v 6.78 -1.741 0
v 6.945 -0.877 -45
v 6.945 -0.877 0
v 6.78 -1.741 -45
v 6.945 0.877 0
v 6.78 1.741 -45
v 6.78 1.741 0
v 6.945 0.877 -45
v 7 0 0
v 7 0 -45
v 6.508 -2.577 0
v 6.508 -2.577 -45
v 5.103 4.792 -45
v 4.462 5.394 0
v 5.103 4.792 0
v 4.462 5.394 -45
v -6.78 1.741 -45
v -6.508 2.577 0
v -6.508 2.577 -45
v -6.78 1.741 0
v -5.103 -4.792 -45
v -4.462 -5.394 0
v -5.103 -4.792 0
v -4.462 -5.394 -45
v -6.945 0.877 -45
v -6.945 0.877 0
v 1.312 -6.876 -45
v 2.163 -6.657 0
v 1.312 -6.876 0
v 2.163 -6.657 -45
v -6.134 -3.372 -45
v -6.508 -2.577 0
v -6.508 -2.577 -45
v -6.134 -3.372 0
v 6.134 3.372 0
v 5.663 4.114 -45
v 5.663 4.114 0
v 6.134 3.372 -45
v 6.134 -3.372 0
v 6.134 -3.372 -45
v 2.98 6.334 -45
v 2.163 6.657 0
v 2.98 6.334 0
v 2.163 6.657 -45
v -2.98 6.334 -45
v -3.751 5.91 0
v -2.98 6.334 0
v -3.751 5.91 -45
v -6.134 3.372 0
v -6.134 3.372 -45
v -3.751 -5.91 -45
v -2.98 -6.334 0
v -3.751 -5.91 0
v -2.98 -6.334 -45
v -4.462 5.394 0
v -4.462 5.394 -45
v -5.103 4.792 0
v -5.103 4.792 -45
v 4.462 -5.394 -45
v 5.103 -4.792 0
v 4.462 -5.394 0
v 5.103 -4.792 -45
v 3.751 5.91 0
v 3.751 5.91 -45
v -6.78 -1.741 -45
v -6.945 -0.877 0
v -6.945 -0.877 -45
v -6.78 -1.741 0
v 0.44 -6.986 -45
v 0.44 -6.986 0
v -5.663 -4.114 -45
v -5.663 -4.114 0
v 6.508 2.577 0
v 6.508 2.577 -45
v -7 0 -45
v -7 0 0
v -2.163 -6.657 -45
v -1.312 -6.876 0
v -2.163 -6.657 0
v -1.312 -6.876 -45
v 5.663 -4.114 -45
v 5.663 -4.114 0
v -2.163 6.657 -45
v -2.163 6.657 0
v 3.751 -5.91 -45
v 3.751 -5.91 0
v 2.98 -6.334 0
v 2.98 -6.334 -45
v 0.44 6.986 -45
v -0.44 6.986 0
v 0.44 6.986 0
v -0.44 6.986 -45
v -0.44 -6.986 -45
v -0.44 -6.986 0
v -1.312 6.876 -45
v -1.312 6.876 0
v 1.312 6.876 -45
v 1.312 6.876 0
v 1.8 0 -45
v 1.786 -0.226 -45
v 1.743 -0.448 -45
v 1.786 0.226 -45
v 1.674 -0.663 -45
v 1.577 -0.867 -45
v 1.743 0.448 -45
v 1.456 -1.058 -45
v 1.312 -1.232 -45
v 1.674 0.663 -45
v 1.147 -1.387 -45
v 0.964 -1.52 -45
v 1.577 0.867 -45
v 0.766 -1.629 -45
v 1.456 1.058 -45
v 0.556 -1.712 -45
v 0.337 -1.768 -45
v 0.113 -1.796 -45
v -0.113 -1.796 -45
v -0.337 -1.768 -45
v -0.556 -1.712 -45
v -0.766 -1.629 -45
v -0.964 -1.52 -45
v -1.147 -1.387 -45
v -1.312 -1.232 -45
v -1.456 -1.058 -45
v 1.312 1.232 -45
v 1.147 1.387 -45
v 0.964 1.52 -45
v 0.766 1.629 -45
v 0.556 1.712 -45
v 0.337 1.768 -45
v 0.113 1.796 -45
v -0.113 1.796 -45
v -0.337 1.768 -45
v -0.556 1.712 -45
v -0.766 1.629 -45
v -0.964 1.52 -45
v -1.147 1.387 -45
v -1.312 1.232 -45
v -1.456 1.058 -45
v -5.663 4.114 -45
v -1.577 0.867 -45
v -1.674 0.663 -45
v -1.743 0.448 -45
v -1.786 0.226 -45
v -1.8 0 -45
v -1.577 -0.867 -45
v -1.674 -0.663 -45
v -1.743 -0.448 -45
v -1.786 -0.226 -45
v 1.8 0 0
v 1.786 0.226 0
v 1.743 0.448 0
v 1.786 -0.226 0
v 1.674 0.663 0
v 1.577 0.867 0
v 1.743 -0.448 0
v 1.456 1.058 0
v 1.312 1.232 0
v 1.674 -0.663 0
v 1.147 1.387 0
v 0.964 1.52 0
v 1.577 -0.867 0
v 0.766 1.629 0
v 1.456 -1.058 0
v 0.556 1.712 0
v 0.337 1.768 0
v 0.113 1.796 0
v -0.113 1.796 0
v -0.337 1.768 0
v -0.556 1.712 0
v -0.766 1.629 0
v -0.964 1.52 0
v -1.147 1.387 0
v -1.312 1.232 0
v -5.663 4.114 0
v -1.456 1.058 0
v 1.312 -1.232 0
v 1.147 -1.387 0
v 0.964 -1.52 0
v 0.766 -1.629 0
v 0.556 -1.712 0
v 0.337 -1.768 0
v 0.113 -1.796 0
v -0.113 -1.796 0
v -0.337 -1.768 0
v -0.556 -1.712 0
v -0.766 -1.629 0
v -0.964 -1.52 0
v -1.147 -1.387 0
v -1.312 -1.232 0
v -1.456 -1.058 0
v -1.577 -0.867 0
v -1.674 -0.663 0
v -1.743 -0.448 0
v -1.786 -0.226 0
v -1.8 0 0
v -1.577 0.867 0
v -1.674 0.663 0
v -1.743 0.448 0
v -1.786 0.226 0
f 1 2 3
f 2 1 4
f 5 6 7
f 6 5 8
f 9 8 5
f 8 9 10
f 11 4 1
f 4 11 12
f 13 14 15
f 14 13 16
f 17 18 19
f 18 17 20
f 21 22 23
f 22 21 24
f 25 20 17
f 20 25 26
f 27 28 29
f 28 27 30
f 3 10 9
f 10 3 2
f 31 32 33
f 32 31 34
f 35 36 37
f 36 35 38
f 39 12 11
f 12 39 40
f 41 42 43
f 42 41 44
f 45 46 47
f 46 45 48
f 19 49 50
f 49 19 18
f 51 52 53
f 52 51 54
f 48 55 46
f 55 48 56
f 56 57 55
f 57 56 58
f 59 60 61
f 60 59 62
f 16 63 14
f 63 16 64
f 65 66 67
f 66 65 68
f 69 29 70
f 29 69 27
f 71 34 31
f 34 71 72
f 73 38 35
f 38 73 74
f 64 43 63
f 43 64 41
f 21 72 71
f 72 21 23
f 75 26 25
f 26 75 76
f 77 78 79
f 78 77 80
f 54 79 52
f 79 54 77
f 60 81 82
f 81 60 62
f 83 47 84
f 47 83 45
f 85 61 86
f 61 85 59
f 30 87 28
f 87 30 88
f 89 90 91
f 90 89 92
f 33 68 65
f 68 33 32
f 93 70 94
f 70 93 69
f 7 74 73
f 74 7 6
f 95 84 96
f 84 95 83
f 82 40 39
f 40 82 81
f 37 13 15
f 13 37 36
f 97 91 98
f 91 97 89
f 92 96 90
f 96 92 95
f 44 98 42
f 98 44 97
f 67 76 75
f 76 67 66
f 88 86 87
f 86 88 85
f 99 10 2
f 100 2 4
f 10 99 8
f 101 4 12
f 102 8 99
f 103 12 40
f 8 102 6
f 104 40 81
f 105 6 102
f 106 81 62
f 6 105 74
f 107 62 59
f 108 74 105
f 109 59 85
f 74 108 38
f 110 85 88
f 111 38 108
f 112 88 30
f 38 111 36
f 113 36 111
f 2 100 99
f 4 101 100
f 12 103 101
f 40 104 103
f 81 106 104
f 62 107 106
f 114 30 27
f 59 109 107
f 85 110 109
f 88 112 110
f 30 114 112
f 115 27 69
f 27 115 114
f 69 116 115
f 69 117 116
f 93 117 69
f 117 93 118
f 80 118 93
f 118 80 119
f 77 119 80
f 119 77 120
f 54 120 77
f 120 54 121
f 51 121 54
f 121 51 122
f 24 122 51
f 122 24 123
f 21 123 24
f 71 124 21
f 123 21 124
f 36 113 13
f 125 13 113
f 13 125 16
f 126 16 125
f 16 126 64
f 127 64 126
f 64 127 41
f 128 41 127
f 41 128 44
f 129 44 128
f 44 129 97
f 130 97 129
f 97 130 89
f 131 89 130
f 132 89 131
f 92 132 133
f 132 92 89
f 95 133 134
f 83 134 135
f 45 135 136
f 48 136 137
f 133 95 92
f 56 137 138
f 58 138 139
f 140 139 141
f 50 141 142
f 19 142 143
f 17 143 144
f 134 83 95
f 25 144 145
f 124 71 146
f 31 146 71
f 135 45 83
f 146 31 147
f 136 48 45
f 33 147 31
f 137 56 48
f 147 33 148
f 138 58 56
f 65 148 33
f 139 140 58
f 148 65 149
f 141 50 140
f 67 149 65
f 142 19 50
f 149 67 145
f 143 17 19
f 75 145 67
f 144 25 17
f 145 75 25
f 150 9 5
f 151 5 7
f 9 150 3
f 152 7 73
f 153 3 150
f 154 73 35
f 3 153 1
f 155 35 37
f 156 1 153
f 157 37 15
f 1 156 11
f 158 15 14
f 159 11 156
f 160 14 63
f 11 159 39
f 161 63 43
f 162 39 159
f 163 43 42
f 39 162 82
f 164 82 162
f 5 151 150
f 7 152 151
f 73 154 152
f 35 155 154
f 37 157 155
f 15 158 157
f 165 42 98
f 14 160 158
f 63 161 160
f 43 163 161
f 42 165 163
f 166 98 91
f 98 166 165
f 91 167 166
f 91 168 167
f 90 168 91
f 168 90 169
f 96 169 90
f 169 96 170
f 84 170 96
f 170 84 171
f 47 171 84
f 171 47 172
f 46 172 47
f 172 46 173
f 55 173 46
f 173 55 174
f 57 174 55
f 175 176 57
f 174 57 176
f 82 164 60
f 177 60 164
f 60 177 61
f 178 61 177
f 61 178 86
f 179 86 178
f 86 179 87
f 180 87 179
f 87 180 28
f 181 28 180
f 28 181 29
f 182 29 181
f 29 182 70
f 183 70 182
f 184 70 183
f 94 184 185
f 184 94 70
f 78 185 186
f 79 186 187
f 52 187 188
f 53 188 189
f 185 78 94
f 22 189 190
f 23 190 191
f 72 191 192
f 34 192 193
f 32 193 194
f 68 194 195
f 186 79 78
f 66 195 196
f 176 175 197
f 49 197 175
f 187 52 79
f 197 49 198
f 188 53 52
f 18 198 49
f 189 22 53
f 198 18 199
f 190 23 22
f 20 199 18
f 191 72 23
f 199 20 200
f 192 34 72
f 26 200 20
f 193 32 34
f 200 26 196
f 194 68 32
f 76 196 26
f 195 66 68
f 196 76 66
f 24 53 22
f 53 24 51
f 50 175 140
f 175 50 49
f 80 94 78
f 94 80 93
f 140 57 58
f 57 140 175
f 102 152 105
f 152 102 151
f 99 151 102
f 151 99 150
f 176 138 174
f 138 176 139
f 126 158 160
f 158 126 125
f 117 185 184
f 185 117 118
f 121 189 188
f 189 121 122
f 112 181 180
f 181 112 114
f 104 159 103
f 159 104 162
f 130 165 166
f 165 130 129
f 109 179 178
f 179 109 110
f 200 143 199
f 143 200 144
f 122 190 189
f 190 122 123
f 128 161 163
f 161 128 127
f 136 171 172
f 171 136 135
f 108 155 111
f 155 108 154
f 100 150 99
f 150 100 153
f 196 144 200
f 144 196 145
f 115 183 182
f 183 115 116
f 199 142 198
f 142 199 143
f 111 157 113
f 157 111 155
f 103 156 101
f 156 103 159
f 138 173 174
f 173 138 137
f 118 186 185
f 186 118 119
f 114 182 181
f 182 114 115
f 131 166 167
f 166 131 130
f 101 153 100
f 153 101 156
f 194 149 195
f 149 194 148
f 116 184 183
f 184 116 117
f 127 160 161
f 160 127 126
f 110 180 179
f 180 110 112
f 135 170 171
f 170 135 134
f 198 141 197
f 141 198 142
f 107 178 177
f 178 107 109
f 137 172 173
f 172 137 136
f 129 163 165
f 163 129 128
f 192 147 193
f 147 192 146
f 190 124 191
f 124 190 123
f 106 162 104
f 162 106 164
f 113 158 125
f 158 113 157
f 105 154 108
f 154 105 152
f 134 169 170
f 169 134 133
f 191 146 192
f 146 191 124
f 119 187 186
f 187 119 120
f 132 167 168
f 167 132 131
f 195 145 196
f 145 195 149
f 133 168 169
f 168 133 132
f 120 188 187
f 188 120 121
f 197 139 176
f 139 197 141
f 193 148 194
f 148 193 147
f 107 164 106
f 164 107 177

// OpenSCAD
$fn = 50;


difference() {
	union() {
		translate(v = [0, 0, -45.0000000000]) {
			cylinder(h = 45, r = 7.0000000000);
		}
	}
	union() {
		#translate(v = [0, 0, -45]) {
			cylinder(h = 45, r = 1.8000000000);
		}
	}
}
